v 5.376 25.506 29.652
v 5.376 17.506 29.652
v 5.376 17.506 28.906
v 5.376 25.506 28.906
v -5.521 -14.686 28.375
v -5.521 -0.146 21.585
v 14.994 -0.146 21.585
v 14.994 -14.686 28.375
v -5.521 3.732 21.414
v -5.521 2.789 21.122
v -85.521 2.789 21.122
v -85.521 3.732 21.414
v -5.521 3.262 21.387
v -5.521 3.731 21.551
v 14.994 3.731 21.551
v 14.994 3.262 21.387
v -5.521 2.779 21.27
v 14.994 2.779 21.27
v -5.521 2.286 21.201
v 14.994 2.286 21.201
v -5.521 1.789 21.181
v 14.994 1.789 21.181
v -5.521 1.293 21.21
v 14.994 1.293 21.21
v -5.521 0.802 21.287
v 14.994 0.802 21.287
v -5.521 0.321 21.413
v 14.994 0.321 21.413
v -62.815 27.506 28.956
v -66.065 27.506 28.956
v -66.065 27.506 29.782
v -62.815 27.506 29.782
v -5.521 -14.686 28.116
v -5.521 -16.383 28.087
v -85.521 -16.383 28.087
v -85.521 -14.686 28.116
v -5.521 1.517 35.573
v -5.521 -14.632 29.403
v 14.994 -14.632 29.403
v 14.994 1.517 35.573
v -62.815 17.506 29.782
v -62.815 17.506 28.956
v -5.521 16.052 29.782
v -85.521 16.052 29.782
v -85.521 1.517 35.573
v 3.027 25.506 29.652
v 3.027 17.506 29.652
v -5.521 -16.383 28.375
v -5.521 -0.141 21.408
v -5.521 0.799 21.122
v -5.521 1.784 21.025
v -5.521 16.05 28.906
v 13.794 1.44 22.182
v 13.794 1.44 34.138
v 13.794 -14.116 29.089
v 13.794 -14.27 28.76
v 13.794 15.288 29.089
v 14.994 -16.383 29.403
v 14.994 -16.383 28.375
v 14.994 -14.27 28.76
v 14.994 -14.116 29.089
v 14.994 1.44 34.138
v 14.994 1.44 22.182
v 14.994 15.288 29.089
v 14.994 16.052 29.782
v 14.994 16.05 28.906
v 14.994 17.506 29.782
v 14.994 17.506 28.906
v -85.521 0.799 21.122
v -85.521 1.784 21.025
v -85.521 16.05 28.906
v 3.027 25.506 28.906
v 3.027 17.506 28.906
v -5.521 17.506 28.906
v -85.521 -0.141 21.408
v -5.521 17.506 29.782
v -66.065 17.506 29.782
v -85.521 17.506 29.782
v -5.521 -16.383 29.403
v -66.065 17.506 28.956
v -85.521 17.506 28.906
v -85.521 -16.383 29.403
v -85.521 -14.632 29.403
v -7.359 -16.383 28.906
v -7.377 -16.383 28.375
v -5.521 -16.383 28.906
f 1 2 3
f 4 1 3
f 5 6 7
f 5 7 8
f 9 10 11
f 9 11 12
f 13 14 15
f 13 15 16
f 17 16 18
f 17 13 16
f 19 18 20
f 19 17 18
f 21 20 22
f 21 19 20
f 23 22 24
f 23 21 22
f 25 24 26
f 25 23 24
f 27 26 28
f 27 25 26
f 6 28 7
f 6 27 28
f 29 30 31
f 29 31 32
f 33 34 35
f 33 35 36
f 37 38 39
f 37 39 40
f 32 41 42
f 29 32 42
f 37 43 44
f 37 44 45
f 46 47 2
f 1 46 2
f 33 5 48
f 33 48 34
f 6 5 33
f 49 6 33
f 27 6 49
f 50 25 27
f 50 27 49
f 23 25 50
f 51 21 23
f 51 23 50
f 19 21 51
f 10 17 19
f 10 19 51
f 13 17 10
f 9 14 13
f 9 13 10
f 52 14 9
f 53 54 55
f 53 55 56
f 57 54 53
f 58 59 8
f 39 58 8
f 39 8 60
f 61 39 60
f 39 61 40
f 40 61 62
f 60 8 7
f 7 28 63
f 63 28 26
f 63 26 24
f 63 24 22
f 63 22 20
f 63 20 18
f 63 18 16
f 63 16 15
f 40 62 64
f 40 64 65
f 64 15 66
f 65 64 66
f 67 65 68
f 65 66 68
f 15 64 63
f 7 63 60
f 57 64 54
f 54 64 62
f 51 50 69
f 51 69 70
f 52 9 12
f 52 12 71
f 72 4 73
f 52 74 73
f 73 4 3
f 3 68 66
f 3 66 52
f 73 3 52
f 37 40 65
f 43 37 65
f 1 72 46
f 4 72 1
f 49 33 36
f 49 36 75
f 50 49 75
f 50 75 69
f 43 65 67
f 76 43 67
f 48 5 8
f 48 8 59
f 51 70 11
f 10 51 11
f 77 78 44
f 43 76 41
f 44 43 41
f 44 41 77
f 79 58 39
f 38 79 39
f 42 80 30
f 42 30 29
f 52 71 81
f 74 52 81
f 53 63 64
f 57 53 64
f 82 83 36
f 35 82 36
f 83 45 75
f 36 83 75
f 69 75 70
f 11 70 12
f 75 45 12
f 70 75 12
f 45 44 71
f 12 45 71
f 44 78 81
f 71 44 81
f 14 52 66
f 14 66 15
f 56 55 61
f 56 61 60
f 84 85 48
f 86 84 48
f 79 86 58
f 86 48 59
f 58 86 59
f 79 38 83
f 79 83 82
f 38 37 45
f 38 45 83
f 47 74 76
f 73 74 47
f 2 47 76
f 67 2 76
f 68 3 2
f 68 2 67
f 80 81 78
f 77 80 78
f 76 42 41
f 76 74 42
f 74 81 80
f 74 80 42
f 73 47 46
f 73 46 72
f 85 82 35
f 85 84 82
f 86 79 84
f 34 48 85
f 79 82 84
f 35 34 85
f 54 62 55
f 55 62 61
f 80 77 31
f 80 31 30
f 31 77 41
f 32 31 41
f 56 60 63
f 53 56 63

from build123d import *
from build123d.topology import SkipClean

# Parameters (mm, degrees)
SKETCH4_W           = 62.83623107
SKETCH4_H           = 84.722256574
BOSS_EXTRUDE2_DEPTH = 50
CUT_EXTRUDE2_DEPTH  = 80
CUT_EXTRUDE3_DEPTH  = 80
CUT_EXTRUDE5_DEPTH  = 80
CUT_EXTRUDE6_DEPTH  = 3
CUT_EXTRUDE8_DEPTH  = 80
CUT_EXTRUDE9_DEPTH  = 80
SKETCH11_W          = 5.870888161
SKETCH11_H          = 1.865764547
BOSS_EXTRUDE3_DEPTH = 20
SCALE1_SCALE        = 0.5
SCALE2_SCALE        = 0.4
SCALE3_SCALE        = 0.5
SCALE5_SCALE        = 4
BOSS_EXTRUDE5_DEPTH = 80
SKETCH15_W          = 3.250018584
SKETCH15_H          = 0.826724594
BOSS_EXTRUDE6_DEPTH = 10


with BuildPart() as part:
    # Sketch4 → Boss-Extrude2 (new body)
    with BuildSketch(Plane.XY):
        Rectangle(SKETCH4_W, SKETCH4_H)
    extrude(amount=BOSS_EXTRUDE2_DEPTH)

    # Sketch5 → Cut-Extrude2 (cut)
    with BuildSketch(Plane(origin=(31.418115535, 0, 0), x_dir=(0, 0, -1), z_dir=(1, 0, 0))):
        Polygon((-31.846034257, 38.728174008), (-31.846034257, 42.361128287), (-50, 42.361128287), (-50, -42.361128287), (-30.898434646, -42.361128287), (-30.898434646, -37.982426726), (-46.322270236, 2.38891709), align=None)
    extrude(amount=-CUT_EXTRUDE2_DEPTH, mode=Mode.SUBTRACT)

    # Sketch6 → Cut-Extrude3 (cut)
    with BuildSketch(Plane(origin=(31.418115535, 0, 0), x_dir=(0, 0, -1), z_dir=(1, 0, 0))):
        Polygon((-29.655383969, 42.361128287), (-29.655383969, 38.722554473), (-8.776416022, 3.750158878), (-28.328453067, -38.117745), (-28.328453067, -42.361128287), (-27.677514405, -46.625913761), (16.839811583, -52.045359618), (10.267667228, 27.190343951), (3.73953172, 54.484047391), align=None)
    extrude(amount=-CUT_EXTRUDE3_DEPTH, mode=Mode.SUBTRACT)

    # Sketch7 → Cut-Extrude5 (cut)
    with BuildSketch(Plane.ZY.offset(31.418115535)):
        with BuildLine():
            ThreePointArc((13.228873585, 11.208051798), (10.417703783, 4.563945687), (11.71087014, -2.533556863))
            ThreePointArc((11.71087014, -2.533556863), (0.747619784, 5.632177302), (13.228873585, 11.208051798))
        make_face()
    extrude(amount=-CUT_EXTRUDE5_DEPTH, mode=Mode.SUBTRACT)

    # Sketch8 → Cut-Extrude6 (cut)
    with BuildSketch(Plane(origin=(31.418115535, 0, 0), x_dir=(0, 0, -1), z_dir=(1, 0, 0))):
        Polygon((-30.111598921, 36.817435747), (-42.735074125, 2.19595341), (-30.111598921, -36.694083179), (-29.289064541, -37.07820135), (-12.845557678, 2.19595341), align=None)
    extrude(amount=-CUT_EXTRUDE6_DEPTH, mode=Mode.SUBTRACT)

    # Sketch9 → Cut-Extrude8 (cut)
    with BuildSketch(Plane(origin=(0, 0, 29.655383969), x_dir=(-1, 0, 0), z_dir=(0, 0, -1))):
        Polygon((19.869908303, 42.361128287), (19.869908303, 38.722554473), (19.869908303, 5.586987563), (19.869908303, -4.186945454), (19.869908303, -38.208459621), (19.869908303, -42.059759196), (19.869908303, -47.026854784), (41.256673117, -49.585938288), (42.081255469, -21.197702537), (42.081255469, 12.428184914), (37.482224788, 37.513066745), (31.418115535, 49.4837873), align=None)
    extrude(amount=-CUT_EXTRUDE8_DEPTH, mode=Mode.SUBTRACT)

    # Sketch10 → Cut-Extrude9 (cut)
    with BuildSketch(Plane(origin=(0, -2.877407212, 4.819674209), x_dir=(-1, 0, 0), z_dir=(0, 0.5126085745439567, -0.8586224136976701))):
        Polygon((19.869908303, 48.44965729), (25.693686727, -39.803296282), (32.448126733, -43.444815965), (49.802642339, -43.444815965), (32.448126733, 57.840856492), align=None)
    extrude(amount=-CUT_EXTRUDE9_DEPTH, mode=Mode.SUBTRACT)

    # Sketch11 → Boss-Extrude3 (add)
    with BuildSketch(Plane(origin=(0, 42.361128287, 0), x_dir=(1, 0, 0), z_dir=(0, 1, 0))):
        with Locations((4.437413085, -30.588266243)):
            Rectangle(SKETCH11_W, SKETCH11_H)
    extrude(amount=BOSS_EXTRUDE3_DEPTH)


with BuildPart() as part_1:
    # Scale1: scaled about (4.044501914, 0.935318094, 28.406526913)
    add(part.part.scale(SCALE1_SCALE).moved(Location((2.022250957, 0.467659047, 14.203263457))))


with BuildPart() as part_2:
    # Scale2: scaled about (4.044501914, 0.935318094, 28.406526913)
    add(part_1.part.scale(SCALE2_SCALE).moved(Location((2.426701148, 0.561190856, 17.043916148))))


with BuildPart() as part_3:
    # Scale3: scaled about (4.044501914, 0.935318094, 28.406526913)
    add(part_2.part.scale(SCALE3_SCALE).moved(Location((2.022250957, 0.467659047, 14.203263457))))


with BuildPart() as part_4:
    # Scale5: scaled about (4.044501914, 0.935318094, 28.406526913)
    add(part_3.part.scale(SCALE5_SCALE).moved(Location((-12.133505742, -2.805954282, -85.219580739))))


with BuildPart() as boss_extrude5_tool:
    # Sketch14 → Boss-Extrude5 (new body)
    with SkipClean():  # the faces are left unmerged after this step: merging them gives an invalid solid
        with BuildSketch(Plane.ZY.offset(5.521262115)):
            Polygon((28.906071344, 17.505641119), (29.782331459, 17.505641119), (29.782331459, 16.052459408), (35.572825851, 1.51675664), (29.403291615, -14.631780886), (29.403291615, -16.38326151), (28.087210799, -16.38326151), (28.1159044, -14.686132768), (21.408340925, -0.141125859), (21.121993698, 0.799090379), (21.024804823, 1.784179002), (21.121993698, 2.789147348), (21.41419066, 3.732235959), (28.906071344, 16.050211594), align=None)
        extrude(amount=BOSS_EXTRUDE5_DEPTH)


with BuildPart() as part_5:
    with SkipClean():  # the faces are left unmerged after this step: merging them gives an invalid solid
        add(part_4.part)


with BuildPart() as part_6:
    # Boss-Extrude5: joined with boss_extrude5_tool
    with SkipClean():  # the faces are left unmerged after this step: merging them gives an invalid solid
        add(part_5.part.fuse(boss_extrude5_tool.part, tol=0.00001))

    # Sketch15 → Boss-Extrude6 (add)
    with SkipClean():  # the faces are left unmerged after this step: merging them gives an invalid solid
        with BuildSketch(Plane(origin=(0, 17.505641119, 0), x_dir=(1, 0, 0), z_dir=(0, 1, 0))):
            with Locations((-64.439728037, -29.368969162)):
                Rectangle(SKETCH15_W, SKETCH15_H)
        extrude(amount=BOSS_EXTRUDE6_DEPTH)


solid = part_6.part
